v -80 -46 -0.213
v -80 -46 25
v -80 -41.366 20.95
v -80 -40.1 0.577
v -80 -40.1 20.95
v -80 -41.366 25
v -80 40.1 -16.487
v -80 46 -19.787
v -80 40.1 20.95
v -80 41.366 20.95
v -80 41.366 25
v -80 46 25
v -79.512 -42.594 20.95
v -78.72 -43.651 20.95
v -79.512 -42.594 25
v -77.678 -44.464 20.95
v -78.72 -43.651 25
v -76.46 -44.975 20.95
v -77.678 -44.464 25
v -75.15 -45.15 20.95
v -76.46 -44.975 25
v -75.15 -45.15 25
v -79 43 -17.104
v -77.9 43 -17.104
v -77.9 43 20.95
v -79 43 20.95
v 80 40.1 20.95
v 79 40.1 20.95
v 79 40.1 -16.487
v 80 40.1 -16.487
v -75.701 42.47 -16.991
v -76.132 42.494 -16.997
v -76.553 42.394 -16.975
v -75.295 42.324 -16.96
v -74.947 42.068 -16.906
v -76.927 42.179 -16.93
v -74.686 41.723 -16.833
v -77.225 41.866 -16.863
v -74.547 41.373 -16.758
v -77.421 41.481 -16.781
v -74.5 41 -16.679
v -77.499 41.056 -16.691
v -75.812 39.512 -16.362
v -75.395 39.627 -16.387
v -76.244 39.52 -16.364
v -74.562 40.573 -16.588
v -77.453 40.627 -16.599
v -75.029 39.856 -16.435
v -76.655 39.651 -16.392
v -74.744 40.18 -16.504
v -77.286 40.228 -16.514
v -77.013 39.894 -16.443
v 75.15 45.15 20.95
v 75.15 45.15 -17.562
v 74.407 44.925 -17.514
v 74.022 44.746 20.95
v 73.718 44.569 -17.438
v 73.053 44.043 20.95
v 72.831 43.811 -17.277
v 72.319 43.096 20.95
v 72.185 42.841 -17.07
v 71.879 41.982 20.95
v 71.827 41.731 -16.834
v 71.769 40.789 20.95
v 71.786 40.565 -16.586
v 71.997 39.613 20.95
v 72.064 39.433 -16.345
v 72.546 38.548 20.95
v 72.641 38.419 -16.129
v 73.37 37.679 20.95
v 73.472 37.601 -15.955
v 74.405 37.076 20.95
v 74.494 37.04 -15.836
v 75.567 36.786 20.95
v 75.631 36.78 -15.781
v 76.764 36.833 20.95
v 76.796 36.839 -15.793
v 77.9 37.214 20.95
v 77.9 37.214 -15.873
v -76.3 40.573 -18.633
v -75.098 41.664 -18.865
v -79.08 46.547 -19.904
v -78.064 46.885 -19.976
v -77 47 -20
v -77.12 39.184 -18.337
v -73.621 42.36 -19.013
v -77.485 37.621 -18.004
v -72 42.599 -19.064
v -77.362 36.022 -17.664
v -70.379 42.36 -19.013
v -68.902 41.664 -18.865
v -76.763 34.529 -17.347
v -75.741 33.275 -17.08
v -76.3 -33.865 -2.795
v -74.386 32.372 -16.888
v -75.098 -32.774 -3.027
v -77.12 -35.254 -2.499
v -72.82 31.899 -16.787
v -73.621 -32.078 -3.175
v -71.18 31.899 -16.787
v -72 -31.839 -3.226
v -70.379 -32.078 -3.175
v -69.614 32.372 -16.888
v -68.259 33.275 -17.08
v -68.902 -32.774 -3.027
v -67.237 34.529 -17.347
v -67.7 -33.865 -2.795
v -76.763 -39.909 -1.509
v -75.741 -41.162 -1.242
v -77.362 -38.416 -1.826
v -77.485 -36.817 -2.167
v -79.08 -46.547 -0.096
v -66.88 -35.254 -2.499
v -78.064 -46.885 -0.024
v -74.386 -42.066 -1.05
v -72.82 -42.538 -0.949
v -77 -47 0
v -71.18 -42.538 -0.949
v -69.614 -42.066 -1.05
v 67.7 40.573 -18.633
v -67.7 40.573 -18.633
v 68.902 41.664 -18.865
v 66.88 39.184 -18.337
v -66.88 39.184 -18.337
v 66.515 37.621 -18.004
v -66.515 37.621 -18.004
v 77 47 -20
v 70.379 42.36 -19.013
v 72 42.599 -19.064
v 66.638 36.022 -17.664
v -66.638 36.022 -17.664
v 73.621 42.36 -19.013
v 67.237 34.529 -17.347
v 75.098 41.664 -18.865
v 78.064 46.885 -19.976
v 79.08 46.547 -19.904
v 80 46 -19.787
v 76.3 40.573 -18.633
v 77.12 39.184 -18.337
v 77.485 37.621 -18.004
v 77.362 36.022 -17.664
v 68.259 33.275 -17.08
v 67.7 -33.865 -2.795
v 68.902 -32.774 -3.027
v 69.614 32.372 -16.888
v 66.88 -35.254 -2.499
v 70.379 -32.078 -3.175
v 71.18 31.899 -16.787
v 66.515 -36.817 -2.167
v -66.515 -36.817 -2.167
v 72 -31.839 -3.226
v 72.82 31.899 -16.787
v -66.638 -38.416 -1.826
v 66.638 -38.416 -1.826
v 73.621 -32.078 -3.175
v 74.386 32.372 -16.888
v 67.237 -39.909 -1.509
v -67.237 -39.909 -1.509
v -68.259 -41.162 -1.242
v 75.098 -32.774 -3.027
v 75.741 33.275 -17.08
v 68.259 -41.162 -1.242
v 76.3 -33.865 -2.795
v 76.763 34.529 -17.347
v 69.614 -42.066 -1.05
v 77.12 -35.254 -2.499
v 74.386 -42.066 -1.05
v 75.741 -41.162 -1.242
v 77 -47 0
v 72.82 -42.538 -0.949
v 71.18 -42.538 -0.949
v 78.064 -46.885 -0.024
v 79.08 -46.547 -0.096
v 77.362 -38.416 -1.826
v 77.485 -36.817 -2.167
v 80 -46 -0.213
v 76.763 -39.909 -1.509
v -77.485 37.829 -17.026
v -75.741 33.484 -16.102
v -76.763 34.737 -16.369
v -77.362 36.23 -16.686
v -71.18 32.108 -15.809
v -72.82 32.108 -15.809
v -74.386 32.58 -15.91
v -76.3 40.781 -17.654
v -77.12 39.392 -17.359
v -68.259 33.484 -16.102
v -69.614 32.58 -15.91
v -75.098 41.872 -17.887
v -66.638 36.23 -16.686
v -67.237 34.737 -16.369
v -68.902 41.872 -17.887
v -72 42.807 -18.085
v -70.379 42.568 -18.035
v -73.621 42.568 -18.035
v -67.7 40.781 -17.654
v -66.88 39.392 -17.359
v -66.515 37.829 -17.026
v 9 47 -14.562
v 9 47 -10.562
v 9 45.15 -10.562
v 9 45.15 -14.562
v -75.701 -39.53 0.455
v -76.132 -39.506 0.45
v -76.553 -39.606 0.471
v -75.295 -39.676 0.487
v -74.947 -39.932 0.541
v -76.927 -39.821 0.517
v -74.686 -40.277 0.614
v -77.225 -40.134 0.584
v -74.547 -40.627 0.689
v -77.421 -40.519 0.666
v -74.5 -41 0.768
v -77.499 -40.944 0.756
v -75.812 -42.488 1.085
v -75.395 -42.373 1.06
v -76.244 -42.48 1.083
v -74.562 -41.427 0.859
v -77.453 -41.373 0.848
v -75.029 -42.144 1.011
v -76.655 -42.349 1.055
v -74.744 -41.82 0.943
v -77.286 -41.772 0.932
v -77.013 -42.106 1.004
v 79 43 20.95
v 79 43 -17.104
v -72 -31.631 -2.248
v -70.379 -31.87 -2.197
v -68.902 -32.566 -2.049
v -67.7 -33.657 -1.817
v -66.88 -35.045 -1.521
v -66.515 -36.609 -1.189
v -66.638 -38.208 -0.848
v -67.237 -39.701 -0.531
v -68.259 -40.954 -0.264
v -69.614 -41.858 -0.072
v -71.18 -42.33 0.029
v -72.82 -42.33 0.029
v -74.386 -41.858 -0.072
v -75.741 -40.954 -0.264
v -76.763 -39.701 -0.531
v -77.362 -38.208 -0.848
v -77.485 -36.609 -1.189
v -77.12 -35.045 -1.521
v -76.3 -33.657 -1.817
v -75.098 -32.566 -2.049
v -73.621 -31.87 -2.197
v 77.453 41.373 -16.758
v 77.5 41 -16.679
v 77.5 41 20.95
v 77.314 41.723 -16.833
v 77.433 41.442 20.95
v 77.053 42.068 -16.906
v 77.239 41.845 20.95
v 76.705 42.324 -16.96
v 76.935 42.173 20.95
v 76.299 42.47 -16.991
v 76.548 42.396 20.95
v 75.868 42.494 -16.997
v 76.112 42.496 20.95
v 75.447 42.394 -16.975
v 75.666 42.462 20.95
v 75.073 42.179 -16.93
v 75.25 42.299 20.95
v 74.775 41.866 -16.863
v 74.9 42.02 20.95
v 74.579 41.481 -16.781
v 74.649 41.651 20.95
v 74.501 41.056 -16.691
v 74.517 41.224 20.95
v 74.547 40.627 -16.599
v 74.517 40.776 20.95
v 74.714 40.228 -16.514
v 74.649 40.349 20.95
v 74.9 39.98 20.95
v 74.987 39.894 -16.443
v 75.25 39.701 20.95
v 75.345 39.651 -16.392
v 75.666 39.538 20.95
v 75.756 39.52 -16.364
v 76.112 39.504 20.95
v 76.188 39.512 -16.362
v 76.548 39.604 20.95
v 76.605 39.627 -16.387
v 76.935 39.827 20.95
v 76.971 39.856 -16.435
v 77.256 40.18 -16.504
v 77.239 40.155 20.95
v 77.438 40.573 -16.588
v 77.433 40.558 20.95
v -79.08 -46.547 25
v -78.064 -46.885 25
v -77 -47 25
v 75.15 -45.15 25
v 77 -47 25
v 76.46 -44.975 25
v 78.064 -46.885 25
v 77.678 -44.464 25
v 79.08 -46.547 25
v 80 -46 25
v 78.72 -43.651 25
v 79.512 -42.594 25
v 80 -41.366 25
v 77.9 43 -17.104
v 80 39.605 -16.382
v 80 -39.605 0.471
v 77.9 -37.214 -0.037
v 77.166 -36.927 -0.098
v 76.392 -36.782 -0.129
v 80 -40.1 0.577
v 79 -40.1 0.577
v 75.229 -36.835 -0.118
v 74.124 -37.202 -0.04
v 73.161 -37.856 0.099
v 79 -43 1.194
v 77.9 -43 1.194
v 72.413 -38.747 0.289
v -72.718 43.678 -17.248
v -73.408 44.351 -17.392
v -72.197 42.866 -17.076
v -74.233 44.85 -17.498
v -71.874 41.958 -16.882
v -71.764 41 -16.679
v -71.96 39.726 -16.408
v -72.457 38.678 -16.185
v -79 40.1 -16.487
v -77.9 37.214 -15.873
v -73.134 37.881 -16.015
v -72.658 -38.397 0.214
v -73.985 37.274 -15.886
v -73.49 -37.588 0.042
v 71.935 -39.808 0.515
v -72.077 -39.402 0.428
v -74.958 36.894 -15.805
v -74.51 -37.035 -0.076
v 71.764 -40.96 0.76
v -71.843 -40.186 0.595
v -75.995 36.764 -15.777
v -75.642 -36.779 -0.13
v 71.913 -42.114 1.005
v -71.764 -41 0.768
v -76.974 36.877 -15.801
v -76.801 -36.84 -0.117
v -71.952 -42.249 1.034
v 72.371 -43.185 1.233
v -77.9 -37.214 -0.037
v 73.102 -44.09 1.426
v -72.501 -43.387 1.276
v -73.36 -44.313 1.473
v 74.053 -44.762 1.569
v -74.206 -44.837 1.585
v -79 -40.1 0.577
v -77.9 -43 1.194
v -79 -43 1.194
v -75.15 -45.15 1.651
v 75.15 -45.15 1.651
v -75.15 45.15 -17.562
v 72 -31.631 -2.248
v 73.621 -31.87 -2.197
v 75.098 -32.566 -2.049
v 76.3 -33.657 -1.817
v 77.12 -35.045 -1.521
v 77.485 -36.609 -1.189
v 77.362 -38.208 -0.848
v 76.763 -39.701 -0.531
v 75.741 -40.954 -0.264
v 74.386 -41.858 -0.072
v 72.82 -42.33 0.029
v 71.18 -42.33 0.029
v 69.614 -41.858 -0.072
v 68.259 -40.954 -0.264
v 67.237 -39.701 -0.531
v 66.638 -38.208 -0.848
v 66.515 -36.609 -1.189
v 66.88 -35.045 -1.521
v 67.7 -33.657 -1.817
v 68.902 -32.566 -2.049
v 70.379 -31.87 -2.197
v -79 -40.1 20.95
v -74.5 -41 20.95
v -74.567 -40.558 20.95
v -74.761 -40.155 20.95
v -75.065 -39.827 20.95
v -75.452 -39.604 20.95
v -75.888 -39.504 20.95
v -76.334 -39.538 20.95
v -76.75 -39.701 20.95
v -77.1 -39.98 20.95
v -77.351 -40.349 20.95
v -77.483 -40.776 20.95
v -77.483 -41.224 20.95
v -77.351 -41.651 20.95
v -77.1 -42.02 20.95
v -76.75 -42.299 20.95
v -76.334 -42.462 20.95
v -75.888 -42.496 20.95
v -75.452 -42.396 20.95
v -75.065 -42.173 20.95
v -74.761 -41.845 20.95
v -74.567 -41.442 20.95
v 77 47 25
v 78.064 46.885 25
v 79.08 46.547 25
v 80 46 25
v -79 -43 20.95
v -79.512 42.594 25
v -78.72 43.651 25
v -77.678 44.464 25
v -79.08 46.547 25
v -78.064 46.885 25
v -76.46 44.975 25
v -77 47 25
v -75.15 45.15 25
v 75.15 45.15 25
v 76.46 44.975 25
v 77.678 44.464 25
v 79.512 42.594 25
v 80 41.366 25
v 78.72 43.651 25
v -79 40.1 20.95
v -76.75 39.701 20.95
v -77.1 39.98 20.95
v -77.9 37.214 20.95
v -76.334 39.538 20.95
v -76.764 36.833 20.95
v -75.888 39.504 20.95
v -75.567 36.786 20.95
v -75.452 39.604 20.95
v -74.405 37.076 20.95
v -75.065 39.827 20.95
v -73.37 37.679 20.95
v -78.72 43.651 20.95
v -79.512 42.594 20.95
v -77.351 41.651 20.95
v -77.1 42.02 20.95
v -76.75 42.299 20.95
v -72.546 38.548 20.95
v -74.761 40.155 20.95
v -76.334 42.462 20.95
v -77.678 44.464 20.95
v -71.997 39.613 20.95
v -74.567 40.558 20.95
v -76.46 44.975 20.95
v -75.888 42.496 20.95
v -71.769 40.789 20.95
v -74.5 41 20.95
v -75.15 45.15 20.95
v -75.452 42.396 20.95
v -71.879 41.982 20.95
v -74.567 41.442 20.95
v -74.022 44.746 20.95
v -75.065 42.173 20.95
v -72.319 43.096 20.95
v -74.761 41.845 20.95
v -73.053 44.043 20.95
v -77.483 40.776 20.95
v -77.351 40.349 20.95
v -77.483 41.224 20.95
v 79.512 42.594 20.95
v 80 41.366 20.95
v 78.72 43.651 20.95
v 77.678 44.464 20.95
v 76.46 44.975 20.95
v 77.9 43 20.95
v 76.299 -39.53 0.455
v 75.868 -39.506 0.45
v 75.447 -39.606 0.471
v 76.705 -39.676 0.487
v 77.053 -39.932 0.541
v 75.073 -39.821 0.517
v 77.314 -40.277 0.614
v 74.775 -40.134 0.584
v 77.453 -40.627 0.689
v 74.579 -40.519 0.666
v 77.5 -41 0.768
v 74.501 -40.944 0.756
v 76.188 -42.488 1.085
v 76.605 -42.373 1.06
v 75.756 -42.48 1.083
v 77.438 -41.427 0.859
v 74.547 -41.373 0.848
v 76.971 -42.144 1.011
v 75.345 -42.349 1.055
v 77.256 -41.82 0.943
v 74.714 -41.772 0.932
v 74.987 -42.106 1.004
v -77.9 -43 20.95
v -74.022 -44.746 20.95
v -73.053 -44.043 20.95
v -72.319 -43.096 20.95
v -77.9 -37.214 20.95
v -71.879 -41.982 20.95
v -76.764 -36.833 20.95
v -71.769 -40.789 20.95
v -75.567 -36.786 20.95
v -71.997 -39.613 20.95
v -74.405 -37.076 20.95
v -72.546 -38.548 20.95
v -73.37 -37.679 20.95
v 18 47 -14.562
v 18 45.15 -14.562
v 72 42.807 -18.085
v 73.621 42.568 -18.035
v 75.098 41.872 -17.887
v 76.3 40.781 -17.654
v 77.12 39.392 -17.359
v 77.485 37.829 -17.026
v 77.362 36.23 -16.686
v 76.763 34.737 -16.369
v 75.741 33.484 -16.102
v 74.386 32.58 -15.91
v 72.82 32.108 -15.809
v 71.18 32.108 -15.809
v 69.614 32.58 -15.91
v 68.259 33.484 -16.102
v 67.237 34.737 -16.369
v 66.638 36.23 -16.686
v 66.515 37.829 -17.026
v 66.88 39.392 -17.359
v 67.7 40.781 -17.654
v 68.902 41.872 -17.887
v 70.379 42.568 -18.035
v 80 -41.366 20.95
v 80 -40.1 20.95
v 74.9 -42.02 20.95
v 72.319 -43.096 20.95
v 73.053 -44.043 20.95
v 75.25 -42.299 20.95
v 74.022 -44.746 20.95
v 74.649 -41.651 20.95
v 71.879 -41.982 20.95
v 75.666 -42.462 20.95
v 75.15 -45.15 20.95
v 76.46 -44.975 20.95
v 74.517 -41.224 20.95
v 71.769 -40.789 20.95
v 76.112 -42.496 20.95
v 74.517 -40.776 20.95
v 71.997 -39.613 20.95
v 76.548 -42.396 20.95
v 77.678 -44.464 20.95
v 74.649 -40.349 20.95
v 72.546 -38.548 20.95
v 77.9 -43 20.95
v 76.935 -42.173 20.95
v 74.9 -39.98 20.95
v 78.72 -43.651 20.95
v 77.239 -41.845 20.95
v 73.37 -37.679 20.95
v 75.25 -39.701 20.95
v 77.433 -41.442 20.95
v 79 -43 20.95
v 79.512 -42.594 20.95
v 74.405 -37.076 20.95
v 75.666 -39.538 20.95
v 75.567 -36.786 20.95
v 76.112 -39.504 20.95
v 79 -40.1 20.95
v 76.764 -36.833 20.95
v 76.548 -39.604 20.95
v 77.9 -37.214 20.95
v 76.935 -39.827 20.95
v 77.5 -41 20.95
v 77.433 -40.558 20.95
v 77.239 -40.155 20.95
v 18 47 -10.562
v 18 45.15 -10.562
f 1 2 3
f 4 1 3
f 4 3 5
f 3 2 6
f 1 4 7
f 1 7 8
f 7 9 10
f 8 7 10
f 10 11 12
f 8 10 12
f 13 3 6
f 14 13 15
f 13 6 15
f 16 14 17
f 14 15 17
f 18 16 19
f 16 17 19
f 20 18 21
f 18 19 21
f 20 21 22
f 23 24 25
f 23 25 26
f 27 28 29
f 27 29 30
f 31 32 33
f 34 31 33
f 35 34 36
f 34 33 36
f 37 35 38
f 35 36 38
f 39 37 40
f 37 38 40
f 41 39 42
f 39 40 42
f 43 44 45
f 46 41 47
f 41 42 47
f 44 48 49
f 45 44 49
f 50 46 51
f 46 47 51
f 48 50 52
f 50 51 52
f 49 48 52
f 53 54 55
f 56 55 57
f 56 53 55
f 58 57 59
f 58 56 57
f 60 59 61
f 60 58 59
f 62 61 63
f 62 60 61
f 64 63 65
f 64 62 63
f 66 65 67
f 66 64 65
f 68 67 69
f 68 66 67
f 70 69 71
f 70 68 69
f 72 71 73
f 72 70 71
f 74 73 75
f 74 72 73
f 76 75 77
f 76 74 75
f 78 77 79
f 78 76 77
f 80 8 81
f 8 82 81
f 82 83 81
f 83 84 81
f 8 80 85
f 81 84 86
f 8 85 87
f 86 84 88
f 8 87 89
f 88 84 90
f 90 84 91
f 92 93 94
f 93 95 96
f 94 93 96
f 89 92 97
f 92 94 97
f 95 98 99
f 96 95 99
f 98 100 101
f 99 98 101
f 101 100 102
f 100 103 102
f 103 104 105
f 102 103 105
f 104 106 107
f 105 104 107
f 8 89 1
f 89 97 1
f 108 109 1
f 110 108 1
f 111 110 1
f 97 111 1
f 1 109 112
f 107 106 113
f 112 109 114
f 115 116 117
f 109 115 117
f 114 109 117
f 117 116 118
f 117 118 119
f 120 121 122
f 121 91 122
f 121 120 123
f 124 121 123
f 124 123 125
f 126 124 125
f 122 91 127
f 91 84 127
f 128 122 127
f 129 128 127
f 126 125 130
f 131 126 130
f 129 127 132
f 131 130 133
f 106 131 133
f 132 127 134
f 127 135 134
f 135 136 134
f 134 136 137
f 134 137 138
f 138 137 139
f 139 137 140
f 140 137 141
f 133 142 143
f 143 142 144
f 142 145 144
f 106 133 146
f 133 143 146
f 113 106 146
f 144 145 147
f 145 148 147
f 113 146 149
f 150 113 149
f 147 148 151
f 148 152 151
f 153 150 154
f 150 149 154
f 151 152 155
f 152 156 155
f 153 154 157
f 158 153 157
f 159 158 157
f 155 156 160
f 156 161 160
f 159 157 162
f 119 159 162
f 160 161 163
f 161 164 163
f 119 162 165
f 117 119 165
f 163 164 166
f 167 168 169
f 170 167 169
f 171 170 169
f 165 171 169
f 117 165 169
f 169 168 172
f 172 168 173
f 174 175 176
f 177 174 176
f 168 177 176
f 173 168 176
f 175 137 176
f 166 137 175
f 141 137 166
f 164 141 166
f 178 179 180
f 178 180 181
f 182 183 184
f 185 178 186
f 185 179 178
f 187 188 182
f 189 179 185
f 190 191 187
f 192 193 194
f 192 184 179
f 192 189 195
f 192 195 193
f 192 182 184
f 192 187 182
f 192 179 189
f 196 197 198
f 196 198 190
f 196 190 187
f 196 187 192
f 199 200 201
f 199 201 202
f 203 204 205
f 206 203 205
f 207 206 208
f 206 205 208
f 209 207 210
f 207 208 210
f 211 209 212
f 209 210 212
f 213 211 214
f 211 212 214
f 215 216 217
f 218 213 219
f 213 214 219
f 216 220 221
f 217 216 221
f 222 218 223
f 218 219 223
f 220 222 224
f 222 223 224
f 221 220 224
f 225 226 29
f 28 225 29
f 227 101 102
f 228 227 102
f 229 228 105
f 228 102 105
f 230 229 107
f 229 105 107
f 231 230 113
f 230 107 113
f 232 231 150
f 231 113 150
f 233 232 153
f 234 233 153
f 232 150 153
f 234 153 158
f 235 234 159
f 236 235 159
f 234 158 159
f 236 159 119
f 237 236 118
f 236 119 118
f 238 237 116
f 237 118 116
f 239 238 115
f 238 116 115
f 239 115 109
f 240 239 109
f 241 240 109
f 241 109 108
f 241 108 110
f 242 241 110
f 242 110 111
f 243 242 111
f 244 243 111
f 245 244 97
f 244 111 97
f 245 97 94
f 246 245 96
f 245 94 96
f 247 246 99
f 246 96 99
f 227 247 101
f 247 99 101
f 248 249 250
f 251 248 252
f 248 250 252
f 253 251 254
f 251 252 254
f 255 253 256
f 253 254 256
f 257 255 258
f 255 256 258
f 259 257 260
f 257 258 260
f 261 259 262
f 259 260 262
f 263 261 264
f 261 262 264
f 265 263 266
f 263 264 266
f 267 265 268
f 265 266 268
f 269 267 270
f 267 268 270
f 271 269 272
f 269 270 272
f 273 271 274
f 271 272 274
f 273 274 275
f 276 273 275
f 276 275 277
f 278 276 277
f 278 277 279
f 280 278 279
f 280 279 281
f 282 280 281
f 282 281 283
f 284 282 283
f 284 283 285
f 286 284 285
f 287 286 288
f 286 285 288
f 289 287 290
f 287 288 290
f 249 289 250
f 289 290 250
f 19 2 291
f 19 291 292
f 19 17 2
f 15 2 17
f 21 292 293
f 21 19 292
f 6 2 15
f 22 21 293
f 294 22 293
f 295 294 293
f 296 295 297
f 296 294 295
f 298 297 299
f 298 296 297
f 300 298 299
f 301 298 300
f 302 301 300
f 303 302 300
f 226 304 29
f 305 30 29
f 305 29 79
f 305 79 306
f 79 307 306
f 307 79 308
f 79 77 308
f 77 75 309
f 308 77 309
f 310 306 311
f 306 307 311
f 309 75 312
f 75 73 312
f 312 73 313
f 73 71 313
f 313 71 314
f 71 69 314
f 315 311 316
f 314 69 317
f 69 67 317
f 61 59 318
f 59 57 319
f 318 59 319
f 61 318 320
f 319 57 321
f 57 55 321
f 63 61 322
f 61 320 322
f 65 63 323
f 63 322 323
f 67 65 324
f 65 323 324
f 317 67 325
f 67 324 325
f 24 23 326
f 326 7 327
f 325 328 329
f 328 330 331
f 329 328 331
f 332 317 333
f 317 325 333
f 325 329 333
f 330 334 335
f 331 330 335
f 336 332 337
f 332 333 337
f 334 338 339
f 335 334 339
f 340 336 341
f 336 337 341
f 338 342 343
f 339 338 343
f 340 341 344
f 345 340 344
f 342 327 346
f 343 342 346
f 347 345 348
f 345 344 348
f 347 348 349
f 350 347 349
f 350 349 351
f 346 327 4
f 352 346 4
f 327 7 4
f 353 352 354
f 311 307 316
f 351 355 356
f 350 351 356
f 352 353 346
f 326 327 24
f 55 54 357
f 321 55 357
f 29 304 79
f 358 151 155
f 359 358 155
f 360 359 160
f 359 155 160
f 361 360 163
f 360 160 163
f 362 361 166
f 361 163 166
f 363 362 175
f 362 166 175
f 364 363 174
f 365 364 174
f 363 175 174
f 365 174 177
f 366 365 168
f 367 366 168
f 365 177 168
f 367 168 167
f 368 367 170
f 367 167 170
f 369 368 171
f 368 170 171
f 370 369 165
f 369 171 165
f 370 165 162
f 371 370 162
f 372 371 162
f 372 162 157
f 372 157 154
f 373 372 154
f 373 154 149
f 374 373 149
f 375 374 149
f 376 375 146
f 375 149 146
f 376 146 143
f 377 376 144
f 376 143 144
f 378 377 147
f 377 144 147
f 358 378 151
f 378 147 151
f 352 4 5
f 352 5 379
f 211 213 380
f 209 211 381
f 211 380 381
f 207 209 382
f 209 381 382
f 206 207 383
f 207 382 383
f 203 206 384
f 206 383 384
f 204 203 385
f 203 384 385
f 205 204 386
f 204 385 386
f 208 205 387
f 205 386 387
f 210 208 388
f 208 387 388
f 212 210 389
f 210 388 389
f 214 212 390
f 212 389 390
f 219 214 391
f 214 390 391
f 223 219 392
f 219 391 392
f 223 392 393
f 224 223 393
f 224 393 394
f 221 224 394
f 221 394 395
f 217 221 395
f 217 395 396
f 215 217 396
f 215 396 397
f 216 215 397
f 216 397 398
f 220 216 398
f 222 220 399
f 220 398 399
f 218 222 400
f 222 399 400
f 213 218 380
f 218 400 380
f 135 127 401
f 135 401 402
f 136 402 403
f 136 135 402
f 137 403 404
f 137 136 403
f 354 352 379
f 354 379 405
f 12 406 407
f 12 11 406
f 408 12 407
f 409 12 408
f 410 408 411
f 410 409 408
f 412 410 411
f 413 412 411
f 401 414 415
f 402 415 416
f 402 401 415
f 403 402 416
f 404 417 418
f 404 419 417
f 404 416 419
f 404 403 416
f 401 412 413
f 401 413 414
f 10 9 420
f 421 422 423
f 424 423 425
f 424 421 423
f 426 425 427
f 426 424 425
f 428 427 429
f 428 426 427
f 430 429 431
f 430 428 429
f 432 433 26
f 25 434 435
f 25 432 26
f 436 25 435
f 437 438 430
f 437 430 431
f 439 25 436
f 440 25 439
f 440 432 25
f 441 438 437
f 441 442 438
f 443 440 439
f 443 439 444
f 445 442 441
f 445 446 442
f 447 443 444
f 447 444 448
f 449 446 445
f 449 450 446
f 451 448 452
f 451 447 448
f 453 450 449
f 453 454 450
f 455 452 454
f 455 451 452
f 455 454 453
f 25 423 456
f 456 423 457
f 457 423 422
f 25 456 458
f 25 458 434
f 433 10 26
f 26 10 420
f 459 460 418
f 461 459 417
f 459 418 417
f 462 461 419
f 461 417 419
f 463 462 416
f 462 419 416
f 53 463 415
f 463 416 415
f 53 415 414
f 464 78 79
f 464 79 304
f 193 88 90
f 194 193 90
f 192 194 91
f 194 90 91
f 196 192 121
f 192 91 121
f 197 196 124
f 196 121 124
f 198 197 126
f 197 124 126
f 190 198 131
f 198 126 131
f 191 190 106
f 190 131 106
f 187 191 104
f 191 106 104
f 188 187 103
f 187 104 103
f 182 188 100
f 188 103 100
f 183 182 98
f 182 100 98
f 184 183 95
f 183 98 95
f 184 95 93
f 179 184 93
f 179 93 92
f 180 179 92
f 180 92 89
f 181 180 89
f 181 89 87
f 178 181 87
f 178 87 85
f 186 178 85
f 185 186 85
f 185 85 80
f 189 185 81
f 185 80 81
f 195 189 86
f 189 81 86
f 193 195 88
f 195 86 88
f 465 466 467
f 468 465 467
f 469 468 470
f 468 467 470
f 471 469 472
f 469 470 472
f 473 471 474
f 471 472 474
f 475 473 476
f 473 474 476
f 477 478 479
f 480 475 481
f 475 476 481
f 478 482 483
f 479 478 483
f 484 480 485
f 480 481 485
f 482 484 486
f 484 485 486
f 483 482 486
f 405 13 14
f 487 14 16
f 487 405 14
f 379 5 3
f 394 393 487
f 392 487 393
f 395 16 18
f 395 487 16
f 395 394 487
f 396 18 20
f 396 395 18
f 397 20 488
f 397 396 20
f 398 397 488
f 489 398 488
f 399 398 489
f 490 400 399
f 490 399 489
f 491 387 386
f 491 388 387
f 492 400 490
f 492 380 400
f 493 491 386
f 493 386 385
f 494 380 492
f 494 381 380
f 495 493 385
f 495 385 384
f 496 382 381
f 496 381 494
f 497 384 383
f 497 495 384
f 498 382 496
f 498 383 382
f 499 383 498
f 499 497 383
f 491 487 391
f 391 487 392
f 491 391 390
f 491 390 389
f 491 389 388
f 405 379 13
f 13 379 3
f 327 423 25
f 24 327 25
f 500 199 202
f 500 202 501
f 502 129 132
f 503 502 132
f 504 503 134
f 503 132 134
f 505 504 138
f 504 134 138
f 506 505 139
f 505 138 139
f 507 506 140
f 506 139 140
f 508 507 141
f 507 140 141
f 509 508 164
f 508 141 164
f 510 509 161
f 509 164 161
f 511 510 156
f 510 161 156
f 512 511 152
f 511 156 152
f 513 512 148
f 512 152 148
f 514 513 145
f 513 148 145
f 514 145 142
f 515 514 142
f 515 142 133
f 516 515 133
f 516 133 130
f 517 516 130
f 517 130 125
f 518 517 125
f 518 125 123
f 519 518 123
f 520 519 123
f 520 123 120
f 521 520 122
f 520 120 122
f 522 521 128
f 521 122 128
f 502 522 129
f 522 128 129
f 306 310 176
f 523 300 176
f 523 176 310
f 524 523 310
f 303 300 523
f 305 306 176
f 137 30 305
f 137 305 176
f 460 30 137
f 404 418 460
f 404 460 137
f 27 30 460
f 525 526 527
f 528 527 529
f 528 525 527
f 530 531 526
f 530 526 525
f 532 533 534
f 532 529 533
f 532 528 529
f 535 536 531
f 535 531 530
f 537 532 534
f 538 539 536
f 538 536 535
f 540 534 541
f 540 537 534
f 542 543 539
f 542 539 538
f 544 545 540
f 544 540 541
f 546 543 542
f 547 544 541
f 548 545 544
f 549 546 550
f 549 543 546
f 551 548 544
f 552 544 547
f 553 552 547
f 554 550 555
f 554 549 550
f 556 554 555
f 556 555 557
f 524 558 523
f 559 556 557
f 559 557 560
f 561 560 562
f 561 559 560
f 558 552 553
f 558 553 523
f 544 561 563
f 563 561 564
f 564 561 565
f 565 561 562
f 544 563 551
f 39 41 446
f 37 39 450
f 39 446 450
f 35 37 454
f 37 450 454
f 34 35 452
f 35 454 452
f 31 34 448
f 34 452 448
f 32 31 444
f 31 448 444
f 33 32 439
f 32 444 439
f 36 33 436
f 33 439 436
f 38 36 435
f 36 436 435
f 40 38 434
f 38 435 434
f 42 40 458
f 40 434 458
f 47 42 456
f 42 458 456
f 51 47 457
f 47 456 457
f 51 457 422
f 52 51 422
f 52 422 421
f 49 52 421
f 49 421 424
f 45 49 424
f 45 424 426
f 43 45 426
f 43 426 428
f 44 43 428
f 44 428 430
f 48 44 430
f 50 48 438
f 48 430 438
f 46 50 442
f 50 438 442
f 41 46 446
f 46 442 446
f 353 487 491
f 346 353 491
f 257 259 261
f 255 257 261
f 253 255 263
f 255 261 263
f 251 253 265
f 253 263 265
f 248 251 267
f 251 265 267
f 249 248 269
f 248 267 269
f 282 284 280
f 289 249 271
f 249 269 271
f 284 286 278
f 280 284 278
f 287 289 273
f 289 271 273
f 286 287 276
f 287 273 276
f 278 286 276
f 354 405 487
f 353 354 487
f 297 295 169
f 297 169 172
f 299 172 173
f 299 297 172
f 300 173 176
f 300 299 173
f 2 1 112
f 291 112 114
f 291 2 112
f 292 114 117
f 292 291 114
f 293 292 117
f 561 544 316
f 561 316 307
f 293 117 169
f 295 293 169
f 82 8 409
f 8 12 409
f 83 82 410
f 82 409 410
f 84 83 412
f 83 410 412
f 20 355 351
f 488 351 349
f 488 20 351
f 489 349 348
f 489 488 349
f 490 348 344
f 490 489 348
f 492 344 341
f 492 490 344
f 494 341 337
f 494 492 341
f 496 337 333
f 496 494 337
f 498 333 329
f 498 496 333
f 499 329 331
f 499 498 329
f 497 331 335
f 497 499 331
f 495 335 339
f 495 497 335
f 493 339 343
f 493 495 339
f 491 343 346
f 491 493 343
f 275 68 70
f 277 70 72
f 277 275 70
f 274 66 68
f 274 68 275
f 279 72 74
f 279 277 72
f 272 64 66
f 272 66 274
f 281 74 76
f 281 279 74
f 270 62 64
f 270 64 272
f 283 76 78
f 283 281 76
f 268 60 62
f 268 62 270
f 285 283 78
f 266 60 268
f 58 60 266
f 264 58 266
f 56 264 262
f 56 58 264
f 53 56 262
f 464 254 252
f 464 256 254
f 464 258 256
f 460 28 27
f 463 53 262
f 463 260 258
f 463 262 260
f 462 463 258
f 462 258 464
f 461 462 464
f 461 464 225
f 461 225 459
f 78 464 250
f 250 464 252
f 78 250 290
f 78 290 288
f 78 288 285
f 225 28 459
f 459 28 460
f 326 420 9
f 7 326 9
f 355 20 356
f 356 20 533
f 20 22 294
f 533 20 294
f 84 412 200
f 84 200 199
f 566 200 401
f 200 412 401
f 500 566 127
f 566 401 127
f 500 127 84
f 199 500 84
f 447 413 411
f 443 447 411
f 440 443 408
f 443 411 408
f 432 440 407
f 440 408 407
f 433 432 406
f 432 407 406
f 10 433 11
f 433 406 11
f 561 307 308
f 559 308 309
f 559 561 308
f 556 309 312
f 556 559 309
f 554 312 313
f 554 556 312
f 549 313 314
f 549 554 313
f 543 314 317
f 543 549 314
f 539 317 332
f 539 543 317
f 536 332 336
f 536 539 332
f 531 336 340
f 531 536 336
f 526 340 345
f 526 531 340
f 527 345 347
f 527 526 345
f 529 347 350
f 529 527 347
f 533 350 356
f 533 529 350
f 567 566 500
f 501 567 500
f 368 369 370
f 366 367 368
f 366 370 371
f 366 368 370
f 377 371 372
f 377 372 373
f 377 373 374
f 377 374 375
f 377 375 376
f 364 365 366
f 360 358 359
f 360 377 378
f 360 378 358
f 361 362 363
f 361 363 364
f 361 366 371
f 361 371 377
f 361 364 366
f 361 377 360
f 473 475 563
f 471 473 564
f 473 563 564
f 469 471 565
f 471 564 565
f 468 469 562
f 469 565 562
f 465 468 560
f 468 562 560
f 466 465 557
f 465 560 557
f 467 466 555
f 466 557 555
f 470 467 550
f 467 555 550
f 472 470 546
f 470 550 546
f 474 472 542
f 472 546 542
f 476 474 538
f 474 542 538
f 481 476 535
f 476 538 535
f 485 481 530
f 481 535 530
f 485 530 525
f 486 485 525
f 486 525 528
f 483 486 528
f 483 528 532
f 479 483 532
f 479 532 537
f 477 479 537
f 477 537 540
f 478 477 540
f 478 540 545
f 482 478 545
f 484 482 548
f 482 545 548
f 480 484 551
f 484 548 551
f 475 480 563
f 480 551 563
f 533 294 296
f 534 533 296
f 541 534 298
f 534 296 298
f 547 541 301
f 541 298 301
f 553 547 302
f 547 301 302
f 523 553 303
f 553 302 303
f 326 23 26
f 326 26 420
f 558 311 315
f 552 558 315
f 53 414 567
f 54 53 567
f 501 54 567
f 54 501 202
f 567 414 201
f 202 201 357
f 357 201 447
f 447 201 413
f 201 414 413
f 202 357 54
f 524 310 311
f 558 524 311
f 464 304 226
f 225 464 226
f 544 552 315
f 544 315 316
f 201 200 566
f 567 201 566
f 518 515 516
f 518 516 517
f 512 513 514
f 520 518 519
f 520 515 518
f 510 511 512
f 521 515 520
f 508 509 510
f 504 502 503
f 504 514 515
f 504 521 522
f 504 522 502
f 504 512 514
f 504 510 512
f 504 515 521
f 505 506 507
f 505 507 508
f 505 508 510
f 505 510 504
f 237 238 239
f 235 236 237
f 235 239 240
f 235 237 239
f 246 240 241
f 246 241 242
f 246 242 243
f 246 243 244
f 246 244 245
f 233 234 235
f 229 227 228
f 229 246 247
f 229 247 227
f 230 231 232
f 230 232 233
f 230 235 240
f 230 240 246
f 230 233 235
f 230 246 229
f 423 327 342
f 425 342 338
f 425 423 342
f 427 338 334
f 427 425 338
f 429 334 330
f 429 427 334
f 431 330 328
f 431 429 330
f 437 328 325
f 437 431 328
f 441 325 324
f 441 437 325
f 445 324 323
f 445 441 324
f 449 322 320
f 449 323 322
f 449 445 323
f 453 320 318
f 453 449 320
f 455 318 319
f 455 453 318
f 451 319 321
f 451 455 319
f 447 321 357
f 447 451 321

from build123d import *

# Parameters (mm, degrees)
SKIZZE1_W                       = 164
SKIZZE1_H                       = 94
AUFSATZ_LINEAR_AUSTRAGEN1_DEPTH = 25
AUFSATZ_LINEAR_AUSTRAGEN2_DEPTH = 164
SCHNITT_LINEAR_AUSTRAGEN1_REACH = 106.68
AUFSATZ_LINEAR_AUSTRAGEN3_REACH = 106.68
SKIZZE4_R                       = 4.236153916
SKIZZE4_R_2                     = 1.5
SCHNITT_LINEAR_AUSTRAGEN2_DEPTH = 4.05
VERRUNDUNG1_R                   = 5
SKIZZE7_W                       = 9
SKIZZE7_H                       = 4
SCHNITT_LINEAR_AUSTRAGEN4_DEPTH = 4.05
SKIZZE8_R                       = 5.5
SCHNITT_LINEAR_AUSTRAGEN5_DEPTH = 1
SKIZZE9_W                       = 47.666626173
SKIZZE9_H                       = 143.1878039
SKIZZE9_W_2                     = 41.660611838
SCHNITT_LINEAR_AUSTRAGEN6_DEPTH = 105.680466182
SCHNITT_LINEAR_AUSTRAGEN7_REACH = 103.419


with BuildPart() as part:
    # Skizze1 → Aufsatz-Linear austragen1 (new body)
    with BuildSketch(Plane.XY):
        Rectangle(SKIZZE1_W, SKIZZE1_H)
    extrude(amount=AUFSATZ_LINEAR_AUSTRAGEN1_DEPTH)

    # Skizze2 → Aufsatz-Linear austragen2 (add)
    with BuildSketch(Plane(origin=(82, 0, 0), x_dir=(0, 0, -1), z_dir=(1, 0, 0))):
        Polygon((0, -47), (0, 47), (20, 47), align=None)
    extrude(amount=-AUFSATZ_LINEAR_AUSTRAGEN2_DEPTH)

    # Schnitt-Linear austragen1: up to this plane
    schnitt_linear_austragen1_end = Plane(origin=(-82, 47.416215289, -18.043788142), z_dir=(0, -0.20810764446485866, -0.9781059289848355))
    # Skizze3 → Schnitt-Linear austragen1 (cut, up to the surface)
    with BuildSketch(Plane.XY.offset(25), mode=Mode.PRIVATE) as schnitt_linear_austragen1_sk1:
        with BuildLine():
            Line((-75.15, -45.15), (75.15, -45.15))
            ThreePointArc((75.15, -45.15), (78.685533906, -43.685533906), (80.15, -40.15))
            Line((80.15, -40.15), (80.15, 40.15))
            ThreePointArc((80.15, 40.15), (78.685533906, 43.685533906), (75.15, 45.15))
            Line((75.15, 45.15), (-75.15, 45.15))
            ThreePointArc((-75.15, 45.15), (-78.685533906, 43.685533906), (-80.15, 40.15))
            Line((-80.15, 40.15), (-80.15, -40.15))
            ThreePointArc((-80.15, -40.15), (-78.685533906, -43.685533906), (-75.15, -45.15))
        make_face()
    schnitt_linear_austragen1_tool1 = split(extrude(schnitt_linear_austragen1_sk1.sketch, amount=-SCHNITT_LINEAR_AUSTRAGEN1_REACH, mode=Mode.PRIVATE), bisect_by=schnitt_linear_austragen1_end, keep=Keep.BOTH, mode=Mode.PRIVATE)
    add(schnitt_linear_austragen1_tool1.solids().sort_by_distance((0, 0, 25))[0], mode=Mode.SUBTRACT)

    # Aufsatz-Linear austragen3: up to this plane
    aufsatz_linear_austragen3_end = Plane(origin=(-82, 47.416215289, -18.043788142), z_dir=(0, -0.20810764446485866, -0.9781059289848355))
    # Skizze4 → Aufsatz-Linear austragen3 (add, up to the surface)
    with BuildSketch(Plane.XY.offset(25), mode=Mode.PRIVATE) as aufsatz_linear_austragen3_sk1:
        with Locations((-76, 41)):
            Circle(SKIZZE4_R)
        with Locations((-76, 41)):
            Circle(SKIZZE4_R_2, mode=Mode.SUBTRACT)
    aufsatz_linear_austragen3_tool1 = split(extrude(aufsatz_linear_austragen3_sk1.sketch, amount=-AUFSATZ_LINEAR_AUSTRAGEN3_REACH, mode=Mode.PRIVATE), bisect_by=aufsatz_linear_austragen3_end, keep=Keep.BOTH, mode=Mode.PRIVATE)
    add(aufsatz_linear_austragen3_tool1.solids().sort_by_distance((-80.116337, 41, 25))[0])
    # Skizze4 → Aufsatz-Linear austragen3 (add, up to the surface)
    with BuildSketch(Plane.XY.offset(25), mode=Mode.PRIVATE) as aufsatz_linear_austragen3_sk2:
        with Locations((-76, -41)):
            Circle(SKIZZE4_R)
        with Locations((-76, -41)):
            Circle(SKIZZE4_R_2, mode=Mode.SUBTRACT)
    aufsatz_linear_austragen3_tool2 = split(extrude(aufsatz_linear_austragen3_sk2.sketch, amount=-AUFSATZ_LINEAR_AUSTRAGEN3_REACH, mode=Mode.PRIVATE), bisect_by=aufsatz_linear_austragen3_end, keep=Keep.BOTH, mode=Mode.PRIVATE)
    add(aufsatz_linear_austragen3_tool2.solids().sort_by_distance((-80.116337, -41, 25))[0])
    # Skizze4 → Aufsatz-Linear austragen3 (add, up to the surface)
    with BuildSketch(Plane.XY.offset(25), mode=Mode.PRIVATE) as aufsatz_linear_austragen3_sk3:
        with Locations((76, -41)):
            Circle(SKIZZE4_R)
        with Locations((76, -41)):
            Circle(SKIZZE4_R_2, mode=Mode.SUBTRACT)
    aufsatz_linear_austragen3_tool3 = split(extrude(aufsatz_linear_austragen3_sk3.sketch, amount=-AUFSATZ_LINEAR_AUSTRAGEN3_REACH, mode=Mode.PRIVATE), bisect_by=aufsatz_linear_austragen3_end, keep=Keep.BOTH, mode=Mode.PRIVATE)
    add(aufsatz_linear_austragen3_tool3.solids().sort_by_distance((71.883663, -41, 25))[0])
    # Skizze4 → Aufsatz-Linear austragen3 (add, up to the surface)
    with BuildSketch(Plane.XY.offset(25), mode=Mode.PRIVATE) as aufsatz_linear_austragen3_sk4:
        with Locations((76, 41)):
            Circle(SKIZZE4_R)
        with Locations((76, 41)):
            Circle(SKIZZE4_R_2, mode=Mode.SUBTRACT)
    aufsatz_linear_austragen3_tool4 = split(extrude(aufsatz_linear_austragen3_sk4.sketch, amount=-AUFSATZ_LINEAR_AUSTRAGEN3_REACH, mode=Mode.PRIVATE), bisect_by=aufsatz_linear_austragen3_end, keep=Keep.BOTH, mode=Mode.PRIVATE)
    add(aufsatz_linear_austragen3_tool4.solids().sort_by_distance((71.883663, 41, 25))[0])

    # Skizze6 → Schnitt-Linear austragen2 (cut)
    with BuildSketch(Plane.XY.offset(25)):
        with BuildLine():
            Line((-75.15, -45.15), (75.15, -45.15))
            ThreePointArc((75.15, -45.15), (78.685533906, -43.685533906), (80.15, -40.15))
            Line((80.15, -40.15), (80.15, 40.15))
            ThreePointArc((80.15, 40.15), (78.685533906, 43.685533906), (75.15, 45.15))
            Line((75.15, 45.15), (-75.15, 45.15))
            ThreePointArc((-75.15, 45.15), (-78.685533906, 43.685533906), (-80.15, 40.15))
            Line((-80.15, 40.15), (-80.15, -40.15))
            ThreePointArc((-80.15, -40.15), (-78.685533906, -43.685533906), (-75.15, -45.15))
        make_face()
    extrude(amount=-SCHNITT_LINEAR_AUSTRAGEN2_DEPTH, mode=Mode.SUBTRACT)

    # Verrundung1
    verrundung1_edges = [part.edges().sort_by_distance(p)[0] for p in [
        (82, -47, 12.5),
        (-82, -47, 12.5),
        (-82, 47, 2.5),
        (82, 47, 2.5),
    ]]
    fillet(verrundung1_edges, radius=VERRUNDUNG1_R)

    # Skizze7 → Schnitt-Linear austragen4 (cut)
    with BuildSketch(Plane(origin=(0, 47, 0), x_dir=(1, 0, 0), z_dir=(0, 1, 0))):
        with Locations((13.5, 12.561614676)):
            Rectangle(SKIZZE7_W, SKIZZE7_H)
    extrude(amount=-SCHNITT_LINEAR_AUSTRAGEN4_DEPTH, mode=Mode.SUBTRACT)

    # Skizze8 → Schnitt-Linear austragen5 (cut)
    with BuildSketch(Plane(origin=(0, -2.035513209, -9.566912083), x_dir=(-1, 0, 0), z_dir=(0, -0.20810764446485866, -0.9781059289848355))):
        with Locations(Location((-72, 40.133131552, 0), (0, 0, 90))):
            Circle(SKIZZE8_R)
        with Locations(Location((72, 40.133131552, 0), (0, 0, 90))):
            Circle(SKIZZE8_R)
        with Locations(Location((72, -35.970978662, 0), (0, 0, 90))):
            Circle(SKIZZE8_R)
        with Locations(Location((-72, -35.970978662, 0), (0, 0, 90))):
            Circle(SKIZZE8_R)
    extrude(amount=-SCHNITT_LINEAR_AUSTRAGEN5_DEPTH, mode=Mode.SUBTRACT)

    # Skizze9 → Schnitt-Linear austragen6 (cut, through all)
    with BuildSketch(Plane.XY.offset(25)):
        with Locations((103.833313086, 0)):
            Rectangle(SKIZZE9_W, SKIZZE9_H)
        with Locations((-100.830305919, 0)):
            Rectangle(SKIZZE9_W_2, SKIZZE9_H)
    extrude(amount=-SCHNITT_LINEAR_AUSTRAGEN6_DEPTH, mode=Mode.SUBTRACT)

    # Schnitt-Linear austragen7: up to this plane
    schnitt_linear_austragen7_end = Plane(origin=(-82, 47.416215289, -18.043788142), z_dir=(0, -0.20810764446485866, -0.9781059289848355))
    # Skizze11 → Schnitt-Linear austragen7 (cut, up to the surface)
    with BuildSketch(Plane.XY.offset(20.95), mode=Mode.PRIVATE) as schnitt_linear_austragen7_sk1:
        Polygon((-77.9, 43), (-79, 43), (-79, 40.1), (-80, 40.1), (-80, -40.1), (-79, -40.1), (-79, -43), (-77.9, -43), align=None)
    schnitt_linear_austragen7_tool1 = split(extrude(schnitt_linear_austragen7_sk1.sketch, amount=-SCHNITT_LINEAR_AUSTRAGEN7_REACH, mode=Mode.PRIVATE), bisect_by=schnitt_linear_austragen7_end, keep=Keep.BOTH, mode=Mode.PRIVATE)
    add(schnitt_linear_austragen7_tool1.solids().sort_by_distance((-78.931751, 0, 20.95))[0], mode=Mode.SUBTRACT)
    # Skizze11 → Schnitt-Linear austragen7 (cut, up to the surface)
    with BuildSketch(Plane.XY.offset(20.95), mode=Mode.PRIVATE) as schnitt_linear_austragen7_sk2:
        Polygon((80, 40.1), (80, -40.1), (79, -40.1), (79, -43), (77.9, -43), (77.9, 43), (79, 43), (79, 40.1), align=None)
    schnitt_linear_austragen7_tool2 = split(extrude(schnitt_linear_austragen7_sk2.sketch, amount=-SCHNITT_LINEAR_AUSTRAGEN7_REACH, mode=Mode.PRIVATE), bisect_by=schnitt_linear_austragen7_end, keep=Keep.BOTH, mode=Mode.PRIVATE)
    add(schnitt_linear_austragen7_tool2.solids().sort_by_distance((78.931751, 0, 20.95))[0], mode=Mode.SUBTRACT)


solid = part.part
